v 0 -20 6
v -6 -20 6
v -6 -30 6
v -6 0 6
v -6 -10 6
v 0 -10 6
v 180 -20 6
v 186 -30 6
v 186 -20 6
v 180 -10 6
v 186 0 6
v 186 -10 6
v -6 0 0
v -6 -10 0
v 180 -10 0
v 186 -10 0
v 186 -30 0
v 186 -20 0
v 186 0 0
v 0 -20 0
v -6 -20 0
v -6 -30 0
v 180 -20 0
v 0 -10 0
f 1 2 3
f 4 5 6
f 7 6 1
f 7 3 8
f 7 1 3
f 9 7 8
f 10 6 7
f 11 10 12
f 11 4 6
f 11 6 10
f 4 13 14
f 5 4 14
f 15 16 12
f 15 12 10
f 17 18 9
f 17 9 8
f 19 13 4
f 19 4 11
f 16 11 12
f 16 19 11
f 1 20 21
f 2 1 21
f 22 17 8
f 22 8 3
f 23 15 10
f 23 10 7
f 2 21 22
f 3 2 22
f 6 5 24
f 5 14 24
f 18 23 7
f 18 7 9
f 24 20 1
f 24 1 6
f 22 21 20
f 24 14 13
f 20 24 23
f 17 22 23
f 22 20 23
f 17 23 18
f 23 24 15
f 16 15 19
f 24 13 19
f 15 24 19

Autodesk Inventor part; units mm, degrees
ref_plane "YZ Plane" through (0, 0, 0) normal (1, 0, 0) x (0, 1, 0)
ref_plane "XZ Plane" through (0, 0, 0) normal (0, 1, 0) x (-1, 0, 0)
ref_plane "XY Plane" through (0, 0, 0) normal (0, 0, 1) x (1, 0, 0)
sketch "Эскиз1" plane through (0, 0, 0) normal (0, 0, 1) x (1, 0, 0)
  line L0 (0, 0) -> (180, 0)
  line L1 (180, 0) -> (180, -30)
  line L2 (180, -30) -> (0, -30)
  line L3 (0, -30) -> (0, 0)
  line L4 (0, 0) -> (-6, 0)
  line L5 (-6, 0) -> (-6, -10)
  line L6 (-6, -10) -> (0, -10)
  line L7 (0, -10) -> (0, 0)
  line L8 (0, -20) -> (-6, -20)
  line L9 (-6, -20) -> (-6, -30)
  line L10 (-6, -30) -> (0, -30)
  line L11 (0, -30) -> (0, -20)
  line L12 (180, 0) -> (186, 0)
  line L13 (186, 0) -> (186, -10)
  line L14 (186, -10) -> (180, -10)
  line L15 (180, -10) -> (180, 0)
  line L16 (180, -30) -> (180, -20)
  line L17 (186, -20) -> (186, -30)
  line L18 (186, -30) -> (180, -30)
  line L19 (180, -20) -> (186, -20)
  dimension "d0" = 180
  dimension "d1" = 30
  dimension "d2" = 10
  dimension "d3" = 6
  dimension "d6" = 20
  dimension "d11" = 6
  dimension "d14" = 20
extrude "Выдавливание1" add sketch "Эскиз1" along normal blind 6
